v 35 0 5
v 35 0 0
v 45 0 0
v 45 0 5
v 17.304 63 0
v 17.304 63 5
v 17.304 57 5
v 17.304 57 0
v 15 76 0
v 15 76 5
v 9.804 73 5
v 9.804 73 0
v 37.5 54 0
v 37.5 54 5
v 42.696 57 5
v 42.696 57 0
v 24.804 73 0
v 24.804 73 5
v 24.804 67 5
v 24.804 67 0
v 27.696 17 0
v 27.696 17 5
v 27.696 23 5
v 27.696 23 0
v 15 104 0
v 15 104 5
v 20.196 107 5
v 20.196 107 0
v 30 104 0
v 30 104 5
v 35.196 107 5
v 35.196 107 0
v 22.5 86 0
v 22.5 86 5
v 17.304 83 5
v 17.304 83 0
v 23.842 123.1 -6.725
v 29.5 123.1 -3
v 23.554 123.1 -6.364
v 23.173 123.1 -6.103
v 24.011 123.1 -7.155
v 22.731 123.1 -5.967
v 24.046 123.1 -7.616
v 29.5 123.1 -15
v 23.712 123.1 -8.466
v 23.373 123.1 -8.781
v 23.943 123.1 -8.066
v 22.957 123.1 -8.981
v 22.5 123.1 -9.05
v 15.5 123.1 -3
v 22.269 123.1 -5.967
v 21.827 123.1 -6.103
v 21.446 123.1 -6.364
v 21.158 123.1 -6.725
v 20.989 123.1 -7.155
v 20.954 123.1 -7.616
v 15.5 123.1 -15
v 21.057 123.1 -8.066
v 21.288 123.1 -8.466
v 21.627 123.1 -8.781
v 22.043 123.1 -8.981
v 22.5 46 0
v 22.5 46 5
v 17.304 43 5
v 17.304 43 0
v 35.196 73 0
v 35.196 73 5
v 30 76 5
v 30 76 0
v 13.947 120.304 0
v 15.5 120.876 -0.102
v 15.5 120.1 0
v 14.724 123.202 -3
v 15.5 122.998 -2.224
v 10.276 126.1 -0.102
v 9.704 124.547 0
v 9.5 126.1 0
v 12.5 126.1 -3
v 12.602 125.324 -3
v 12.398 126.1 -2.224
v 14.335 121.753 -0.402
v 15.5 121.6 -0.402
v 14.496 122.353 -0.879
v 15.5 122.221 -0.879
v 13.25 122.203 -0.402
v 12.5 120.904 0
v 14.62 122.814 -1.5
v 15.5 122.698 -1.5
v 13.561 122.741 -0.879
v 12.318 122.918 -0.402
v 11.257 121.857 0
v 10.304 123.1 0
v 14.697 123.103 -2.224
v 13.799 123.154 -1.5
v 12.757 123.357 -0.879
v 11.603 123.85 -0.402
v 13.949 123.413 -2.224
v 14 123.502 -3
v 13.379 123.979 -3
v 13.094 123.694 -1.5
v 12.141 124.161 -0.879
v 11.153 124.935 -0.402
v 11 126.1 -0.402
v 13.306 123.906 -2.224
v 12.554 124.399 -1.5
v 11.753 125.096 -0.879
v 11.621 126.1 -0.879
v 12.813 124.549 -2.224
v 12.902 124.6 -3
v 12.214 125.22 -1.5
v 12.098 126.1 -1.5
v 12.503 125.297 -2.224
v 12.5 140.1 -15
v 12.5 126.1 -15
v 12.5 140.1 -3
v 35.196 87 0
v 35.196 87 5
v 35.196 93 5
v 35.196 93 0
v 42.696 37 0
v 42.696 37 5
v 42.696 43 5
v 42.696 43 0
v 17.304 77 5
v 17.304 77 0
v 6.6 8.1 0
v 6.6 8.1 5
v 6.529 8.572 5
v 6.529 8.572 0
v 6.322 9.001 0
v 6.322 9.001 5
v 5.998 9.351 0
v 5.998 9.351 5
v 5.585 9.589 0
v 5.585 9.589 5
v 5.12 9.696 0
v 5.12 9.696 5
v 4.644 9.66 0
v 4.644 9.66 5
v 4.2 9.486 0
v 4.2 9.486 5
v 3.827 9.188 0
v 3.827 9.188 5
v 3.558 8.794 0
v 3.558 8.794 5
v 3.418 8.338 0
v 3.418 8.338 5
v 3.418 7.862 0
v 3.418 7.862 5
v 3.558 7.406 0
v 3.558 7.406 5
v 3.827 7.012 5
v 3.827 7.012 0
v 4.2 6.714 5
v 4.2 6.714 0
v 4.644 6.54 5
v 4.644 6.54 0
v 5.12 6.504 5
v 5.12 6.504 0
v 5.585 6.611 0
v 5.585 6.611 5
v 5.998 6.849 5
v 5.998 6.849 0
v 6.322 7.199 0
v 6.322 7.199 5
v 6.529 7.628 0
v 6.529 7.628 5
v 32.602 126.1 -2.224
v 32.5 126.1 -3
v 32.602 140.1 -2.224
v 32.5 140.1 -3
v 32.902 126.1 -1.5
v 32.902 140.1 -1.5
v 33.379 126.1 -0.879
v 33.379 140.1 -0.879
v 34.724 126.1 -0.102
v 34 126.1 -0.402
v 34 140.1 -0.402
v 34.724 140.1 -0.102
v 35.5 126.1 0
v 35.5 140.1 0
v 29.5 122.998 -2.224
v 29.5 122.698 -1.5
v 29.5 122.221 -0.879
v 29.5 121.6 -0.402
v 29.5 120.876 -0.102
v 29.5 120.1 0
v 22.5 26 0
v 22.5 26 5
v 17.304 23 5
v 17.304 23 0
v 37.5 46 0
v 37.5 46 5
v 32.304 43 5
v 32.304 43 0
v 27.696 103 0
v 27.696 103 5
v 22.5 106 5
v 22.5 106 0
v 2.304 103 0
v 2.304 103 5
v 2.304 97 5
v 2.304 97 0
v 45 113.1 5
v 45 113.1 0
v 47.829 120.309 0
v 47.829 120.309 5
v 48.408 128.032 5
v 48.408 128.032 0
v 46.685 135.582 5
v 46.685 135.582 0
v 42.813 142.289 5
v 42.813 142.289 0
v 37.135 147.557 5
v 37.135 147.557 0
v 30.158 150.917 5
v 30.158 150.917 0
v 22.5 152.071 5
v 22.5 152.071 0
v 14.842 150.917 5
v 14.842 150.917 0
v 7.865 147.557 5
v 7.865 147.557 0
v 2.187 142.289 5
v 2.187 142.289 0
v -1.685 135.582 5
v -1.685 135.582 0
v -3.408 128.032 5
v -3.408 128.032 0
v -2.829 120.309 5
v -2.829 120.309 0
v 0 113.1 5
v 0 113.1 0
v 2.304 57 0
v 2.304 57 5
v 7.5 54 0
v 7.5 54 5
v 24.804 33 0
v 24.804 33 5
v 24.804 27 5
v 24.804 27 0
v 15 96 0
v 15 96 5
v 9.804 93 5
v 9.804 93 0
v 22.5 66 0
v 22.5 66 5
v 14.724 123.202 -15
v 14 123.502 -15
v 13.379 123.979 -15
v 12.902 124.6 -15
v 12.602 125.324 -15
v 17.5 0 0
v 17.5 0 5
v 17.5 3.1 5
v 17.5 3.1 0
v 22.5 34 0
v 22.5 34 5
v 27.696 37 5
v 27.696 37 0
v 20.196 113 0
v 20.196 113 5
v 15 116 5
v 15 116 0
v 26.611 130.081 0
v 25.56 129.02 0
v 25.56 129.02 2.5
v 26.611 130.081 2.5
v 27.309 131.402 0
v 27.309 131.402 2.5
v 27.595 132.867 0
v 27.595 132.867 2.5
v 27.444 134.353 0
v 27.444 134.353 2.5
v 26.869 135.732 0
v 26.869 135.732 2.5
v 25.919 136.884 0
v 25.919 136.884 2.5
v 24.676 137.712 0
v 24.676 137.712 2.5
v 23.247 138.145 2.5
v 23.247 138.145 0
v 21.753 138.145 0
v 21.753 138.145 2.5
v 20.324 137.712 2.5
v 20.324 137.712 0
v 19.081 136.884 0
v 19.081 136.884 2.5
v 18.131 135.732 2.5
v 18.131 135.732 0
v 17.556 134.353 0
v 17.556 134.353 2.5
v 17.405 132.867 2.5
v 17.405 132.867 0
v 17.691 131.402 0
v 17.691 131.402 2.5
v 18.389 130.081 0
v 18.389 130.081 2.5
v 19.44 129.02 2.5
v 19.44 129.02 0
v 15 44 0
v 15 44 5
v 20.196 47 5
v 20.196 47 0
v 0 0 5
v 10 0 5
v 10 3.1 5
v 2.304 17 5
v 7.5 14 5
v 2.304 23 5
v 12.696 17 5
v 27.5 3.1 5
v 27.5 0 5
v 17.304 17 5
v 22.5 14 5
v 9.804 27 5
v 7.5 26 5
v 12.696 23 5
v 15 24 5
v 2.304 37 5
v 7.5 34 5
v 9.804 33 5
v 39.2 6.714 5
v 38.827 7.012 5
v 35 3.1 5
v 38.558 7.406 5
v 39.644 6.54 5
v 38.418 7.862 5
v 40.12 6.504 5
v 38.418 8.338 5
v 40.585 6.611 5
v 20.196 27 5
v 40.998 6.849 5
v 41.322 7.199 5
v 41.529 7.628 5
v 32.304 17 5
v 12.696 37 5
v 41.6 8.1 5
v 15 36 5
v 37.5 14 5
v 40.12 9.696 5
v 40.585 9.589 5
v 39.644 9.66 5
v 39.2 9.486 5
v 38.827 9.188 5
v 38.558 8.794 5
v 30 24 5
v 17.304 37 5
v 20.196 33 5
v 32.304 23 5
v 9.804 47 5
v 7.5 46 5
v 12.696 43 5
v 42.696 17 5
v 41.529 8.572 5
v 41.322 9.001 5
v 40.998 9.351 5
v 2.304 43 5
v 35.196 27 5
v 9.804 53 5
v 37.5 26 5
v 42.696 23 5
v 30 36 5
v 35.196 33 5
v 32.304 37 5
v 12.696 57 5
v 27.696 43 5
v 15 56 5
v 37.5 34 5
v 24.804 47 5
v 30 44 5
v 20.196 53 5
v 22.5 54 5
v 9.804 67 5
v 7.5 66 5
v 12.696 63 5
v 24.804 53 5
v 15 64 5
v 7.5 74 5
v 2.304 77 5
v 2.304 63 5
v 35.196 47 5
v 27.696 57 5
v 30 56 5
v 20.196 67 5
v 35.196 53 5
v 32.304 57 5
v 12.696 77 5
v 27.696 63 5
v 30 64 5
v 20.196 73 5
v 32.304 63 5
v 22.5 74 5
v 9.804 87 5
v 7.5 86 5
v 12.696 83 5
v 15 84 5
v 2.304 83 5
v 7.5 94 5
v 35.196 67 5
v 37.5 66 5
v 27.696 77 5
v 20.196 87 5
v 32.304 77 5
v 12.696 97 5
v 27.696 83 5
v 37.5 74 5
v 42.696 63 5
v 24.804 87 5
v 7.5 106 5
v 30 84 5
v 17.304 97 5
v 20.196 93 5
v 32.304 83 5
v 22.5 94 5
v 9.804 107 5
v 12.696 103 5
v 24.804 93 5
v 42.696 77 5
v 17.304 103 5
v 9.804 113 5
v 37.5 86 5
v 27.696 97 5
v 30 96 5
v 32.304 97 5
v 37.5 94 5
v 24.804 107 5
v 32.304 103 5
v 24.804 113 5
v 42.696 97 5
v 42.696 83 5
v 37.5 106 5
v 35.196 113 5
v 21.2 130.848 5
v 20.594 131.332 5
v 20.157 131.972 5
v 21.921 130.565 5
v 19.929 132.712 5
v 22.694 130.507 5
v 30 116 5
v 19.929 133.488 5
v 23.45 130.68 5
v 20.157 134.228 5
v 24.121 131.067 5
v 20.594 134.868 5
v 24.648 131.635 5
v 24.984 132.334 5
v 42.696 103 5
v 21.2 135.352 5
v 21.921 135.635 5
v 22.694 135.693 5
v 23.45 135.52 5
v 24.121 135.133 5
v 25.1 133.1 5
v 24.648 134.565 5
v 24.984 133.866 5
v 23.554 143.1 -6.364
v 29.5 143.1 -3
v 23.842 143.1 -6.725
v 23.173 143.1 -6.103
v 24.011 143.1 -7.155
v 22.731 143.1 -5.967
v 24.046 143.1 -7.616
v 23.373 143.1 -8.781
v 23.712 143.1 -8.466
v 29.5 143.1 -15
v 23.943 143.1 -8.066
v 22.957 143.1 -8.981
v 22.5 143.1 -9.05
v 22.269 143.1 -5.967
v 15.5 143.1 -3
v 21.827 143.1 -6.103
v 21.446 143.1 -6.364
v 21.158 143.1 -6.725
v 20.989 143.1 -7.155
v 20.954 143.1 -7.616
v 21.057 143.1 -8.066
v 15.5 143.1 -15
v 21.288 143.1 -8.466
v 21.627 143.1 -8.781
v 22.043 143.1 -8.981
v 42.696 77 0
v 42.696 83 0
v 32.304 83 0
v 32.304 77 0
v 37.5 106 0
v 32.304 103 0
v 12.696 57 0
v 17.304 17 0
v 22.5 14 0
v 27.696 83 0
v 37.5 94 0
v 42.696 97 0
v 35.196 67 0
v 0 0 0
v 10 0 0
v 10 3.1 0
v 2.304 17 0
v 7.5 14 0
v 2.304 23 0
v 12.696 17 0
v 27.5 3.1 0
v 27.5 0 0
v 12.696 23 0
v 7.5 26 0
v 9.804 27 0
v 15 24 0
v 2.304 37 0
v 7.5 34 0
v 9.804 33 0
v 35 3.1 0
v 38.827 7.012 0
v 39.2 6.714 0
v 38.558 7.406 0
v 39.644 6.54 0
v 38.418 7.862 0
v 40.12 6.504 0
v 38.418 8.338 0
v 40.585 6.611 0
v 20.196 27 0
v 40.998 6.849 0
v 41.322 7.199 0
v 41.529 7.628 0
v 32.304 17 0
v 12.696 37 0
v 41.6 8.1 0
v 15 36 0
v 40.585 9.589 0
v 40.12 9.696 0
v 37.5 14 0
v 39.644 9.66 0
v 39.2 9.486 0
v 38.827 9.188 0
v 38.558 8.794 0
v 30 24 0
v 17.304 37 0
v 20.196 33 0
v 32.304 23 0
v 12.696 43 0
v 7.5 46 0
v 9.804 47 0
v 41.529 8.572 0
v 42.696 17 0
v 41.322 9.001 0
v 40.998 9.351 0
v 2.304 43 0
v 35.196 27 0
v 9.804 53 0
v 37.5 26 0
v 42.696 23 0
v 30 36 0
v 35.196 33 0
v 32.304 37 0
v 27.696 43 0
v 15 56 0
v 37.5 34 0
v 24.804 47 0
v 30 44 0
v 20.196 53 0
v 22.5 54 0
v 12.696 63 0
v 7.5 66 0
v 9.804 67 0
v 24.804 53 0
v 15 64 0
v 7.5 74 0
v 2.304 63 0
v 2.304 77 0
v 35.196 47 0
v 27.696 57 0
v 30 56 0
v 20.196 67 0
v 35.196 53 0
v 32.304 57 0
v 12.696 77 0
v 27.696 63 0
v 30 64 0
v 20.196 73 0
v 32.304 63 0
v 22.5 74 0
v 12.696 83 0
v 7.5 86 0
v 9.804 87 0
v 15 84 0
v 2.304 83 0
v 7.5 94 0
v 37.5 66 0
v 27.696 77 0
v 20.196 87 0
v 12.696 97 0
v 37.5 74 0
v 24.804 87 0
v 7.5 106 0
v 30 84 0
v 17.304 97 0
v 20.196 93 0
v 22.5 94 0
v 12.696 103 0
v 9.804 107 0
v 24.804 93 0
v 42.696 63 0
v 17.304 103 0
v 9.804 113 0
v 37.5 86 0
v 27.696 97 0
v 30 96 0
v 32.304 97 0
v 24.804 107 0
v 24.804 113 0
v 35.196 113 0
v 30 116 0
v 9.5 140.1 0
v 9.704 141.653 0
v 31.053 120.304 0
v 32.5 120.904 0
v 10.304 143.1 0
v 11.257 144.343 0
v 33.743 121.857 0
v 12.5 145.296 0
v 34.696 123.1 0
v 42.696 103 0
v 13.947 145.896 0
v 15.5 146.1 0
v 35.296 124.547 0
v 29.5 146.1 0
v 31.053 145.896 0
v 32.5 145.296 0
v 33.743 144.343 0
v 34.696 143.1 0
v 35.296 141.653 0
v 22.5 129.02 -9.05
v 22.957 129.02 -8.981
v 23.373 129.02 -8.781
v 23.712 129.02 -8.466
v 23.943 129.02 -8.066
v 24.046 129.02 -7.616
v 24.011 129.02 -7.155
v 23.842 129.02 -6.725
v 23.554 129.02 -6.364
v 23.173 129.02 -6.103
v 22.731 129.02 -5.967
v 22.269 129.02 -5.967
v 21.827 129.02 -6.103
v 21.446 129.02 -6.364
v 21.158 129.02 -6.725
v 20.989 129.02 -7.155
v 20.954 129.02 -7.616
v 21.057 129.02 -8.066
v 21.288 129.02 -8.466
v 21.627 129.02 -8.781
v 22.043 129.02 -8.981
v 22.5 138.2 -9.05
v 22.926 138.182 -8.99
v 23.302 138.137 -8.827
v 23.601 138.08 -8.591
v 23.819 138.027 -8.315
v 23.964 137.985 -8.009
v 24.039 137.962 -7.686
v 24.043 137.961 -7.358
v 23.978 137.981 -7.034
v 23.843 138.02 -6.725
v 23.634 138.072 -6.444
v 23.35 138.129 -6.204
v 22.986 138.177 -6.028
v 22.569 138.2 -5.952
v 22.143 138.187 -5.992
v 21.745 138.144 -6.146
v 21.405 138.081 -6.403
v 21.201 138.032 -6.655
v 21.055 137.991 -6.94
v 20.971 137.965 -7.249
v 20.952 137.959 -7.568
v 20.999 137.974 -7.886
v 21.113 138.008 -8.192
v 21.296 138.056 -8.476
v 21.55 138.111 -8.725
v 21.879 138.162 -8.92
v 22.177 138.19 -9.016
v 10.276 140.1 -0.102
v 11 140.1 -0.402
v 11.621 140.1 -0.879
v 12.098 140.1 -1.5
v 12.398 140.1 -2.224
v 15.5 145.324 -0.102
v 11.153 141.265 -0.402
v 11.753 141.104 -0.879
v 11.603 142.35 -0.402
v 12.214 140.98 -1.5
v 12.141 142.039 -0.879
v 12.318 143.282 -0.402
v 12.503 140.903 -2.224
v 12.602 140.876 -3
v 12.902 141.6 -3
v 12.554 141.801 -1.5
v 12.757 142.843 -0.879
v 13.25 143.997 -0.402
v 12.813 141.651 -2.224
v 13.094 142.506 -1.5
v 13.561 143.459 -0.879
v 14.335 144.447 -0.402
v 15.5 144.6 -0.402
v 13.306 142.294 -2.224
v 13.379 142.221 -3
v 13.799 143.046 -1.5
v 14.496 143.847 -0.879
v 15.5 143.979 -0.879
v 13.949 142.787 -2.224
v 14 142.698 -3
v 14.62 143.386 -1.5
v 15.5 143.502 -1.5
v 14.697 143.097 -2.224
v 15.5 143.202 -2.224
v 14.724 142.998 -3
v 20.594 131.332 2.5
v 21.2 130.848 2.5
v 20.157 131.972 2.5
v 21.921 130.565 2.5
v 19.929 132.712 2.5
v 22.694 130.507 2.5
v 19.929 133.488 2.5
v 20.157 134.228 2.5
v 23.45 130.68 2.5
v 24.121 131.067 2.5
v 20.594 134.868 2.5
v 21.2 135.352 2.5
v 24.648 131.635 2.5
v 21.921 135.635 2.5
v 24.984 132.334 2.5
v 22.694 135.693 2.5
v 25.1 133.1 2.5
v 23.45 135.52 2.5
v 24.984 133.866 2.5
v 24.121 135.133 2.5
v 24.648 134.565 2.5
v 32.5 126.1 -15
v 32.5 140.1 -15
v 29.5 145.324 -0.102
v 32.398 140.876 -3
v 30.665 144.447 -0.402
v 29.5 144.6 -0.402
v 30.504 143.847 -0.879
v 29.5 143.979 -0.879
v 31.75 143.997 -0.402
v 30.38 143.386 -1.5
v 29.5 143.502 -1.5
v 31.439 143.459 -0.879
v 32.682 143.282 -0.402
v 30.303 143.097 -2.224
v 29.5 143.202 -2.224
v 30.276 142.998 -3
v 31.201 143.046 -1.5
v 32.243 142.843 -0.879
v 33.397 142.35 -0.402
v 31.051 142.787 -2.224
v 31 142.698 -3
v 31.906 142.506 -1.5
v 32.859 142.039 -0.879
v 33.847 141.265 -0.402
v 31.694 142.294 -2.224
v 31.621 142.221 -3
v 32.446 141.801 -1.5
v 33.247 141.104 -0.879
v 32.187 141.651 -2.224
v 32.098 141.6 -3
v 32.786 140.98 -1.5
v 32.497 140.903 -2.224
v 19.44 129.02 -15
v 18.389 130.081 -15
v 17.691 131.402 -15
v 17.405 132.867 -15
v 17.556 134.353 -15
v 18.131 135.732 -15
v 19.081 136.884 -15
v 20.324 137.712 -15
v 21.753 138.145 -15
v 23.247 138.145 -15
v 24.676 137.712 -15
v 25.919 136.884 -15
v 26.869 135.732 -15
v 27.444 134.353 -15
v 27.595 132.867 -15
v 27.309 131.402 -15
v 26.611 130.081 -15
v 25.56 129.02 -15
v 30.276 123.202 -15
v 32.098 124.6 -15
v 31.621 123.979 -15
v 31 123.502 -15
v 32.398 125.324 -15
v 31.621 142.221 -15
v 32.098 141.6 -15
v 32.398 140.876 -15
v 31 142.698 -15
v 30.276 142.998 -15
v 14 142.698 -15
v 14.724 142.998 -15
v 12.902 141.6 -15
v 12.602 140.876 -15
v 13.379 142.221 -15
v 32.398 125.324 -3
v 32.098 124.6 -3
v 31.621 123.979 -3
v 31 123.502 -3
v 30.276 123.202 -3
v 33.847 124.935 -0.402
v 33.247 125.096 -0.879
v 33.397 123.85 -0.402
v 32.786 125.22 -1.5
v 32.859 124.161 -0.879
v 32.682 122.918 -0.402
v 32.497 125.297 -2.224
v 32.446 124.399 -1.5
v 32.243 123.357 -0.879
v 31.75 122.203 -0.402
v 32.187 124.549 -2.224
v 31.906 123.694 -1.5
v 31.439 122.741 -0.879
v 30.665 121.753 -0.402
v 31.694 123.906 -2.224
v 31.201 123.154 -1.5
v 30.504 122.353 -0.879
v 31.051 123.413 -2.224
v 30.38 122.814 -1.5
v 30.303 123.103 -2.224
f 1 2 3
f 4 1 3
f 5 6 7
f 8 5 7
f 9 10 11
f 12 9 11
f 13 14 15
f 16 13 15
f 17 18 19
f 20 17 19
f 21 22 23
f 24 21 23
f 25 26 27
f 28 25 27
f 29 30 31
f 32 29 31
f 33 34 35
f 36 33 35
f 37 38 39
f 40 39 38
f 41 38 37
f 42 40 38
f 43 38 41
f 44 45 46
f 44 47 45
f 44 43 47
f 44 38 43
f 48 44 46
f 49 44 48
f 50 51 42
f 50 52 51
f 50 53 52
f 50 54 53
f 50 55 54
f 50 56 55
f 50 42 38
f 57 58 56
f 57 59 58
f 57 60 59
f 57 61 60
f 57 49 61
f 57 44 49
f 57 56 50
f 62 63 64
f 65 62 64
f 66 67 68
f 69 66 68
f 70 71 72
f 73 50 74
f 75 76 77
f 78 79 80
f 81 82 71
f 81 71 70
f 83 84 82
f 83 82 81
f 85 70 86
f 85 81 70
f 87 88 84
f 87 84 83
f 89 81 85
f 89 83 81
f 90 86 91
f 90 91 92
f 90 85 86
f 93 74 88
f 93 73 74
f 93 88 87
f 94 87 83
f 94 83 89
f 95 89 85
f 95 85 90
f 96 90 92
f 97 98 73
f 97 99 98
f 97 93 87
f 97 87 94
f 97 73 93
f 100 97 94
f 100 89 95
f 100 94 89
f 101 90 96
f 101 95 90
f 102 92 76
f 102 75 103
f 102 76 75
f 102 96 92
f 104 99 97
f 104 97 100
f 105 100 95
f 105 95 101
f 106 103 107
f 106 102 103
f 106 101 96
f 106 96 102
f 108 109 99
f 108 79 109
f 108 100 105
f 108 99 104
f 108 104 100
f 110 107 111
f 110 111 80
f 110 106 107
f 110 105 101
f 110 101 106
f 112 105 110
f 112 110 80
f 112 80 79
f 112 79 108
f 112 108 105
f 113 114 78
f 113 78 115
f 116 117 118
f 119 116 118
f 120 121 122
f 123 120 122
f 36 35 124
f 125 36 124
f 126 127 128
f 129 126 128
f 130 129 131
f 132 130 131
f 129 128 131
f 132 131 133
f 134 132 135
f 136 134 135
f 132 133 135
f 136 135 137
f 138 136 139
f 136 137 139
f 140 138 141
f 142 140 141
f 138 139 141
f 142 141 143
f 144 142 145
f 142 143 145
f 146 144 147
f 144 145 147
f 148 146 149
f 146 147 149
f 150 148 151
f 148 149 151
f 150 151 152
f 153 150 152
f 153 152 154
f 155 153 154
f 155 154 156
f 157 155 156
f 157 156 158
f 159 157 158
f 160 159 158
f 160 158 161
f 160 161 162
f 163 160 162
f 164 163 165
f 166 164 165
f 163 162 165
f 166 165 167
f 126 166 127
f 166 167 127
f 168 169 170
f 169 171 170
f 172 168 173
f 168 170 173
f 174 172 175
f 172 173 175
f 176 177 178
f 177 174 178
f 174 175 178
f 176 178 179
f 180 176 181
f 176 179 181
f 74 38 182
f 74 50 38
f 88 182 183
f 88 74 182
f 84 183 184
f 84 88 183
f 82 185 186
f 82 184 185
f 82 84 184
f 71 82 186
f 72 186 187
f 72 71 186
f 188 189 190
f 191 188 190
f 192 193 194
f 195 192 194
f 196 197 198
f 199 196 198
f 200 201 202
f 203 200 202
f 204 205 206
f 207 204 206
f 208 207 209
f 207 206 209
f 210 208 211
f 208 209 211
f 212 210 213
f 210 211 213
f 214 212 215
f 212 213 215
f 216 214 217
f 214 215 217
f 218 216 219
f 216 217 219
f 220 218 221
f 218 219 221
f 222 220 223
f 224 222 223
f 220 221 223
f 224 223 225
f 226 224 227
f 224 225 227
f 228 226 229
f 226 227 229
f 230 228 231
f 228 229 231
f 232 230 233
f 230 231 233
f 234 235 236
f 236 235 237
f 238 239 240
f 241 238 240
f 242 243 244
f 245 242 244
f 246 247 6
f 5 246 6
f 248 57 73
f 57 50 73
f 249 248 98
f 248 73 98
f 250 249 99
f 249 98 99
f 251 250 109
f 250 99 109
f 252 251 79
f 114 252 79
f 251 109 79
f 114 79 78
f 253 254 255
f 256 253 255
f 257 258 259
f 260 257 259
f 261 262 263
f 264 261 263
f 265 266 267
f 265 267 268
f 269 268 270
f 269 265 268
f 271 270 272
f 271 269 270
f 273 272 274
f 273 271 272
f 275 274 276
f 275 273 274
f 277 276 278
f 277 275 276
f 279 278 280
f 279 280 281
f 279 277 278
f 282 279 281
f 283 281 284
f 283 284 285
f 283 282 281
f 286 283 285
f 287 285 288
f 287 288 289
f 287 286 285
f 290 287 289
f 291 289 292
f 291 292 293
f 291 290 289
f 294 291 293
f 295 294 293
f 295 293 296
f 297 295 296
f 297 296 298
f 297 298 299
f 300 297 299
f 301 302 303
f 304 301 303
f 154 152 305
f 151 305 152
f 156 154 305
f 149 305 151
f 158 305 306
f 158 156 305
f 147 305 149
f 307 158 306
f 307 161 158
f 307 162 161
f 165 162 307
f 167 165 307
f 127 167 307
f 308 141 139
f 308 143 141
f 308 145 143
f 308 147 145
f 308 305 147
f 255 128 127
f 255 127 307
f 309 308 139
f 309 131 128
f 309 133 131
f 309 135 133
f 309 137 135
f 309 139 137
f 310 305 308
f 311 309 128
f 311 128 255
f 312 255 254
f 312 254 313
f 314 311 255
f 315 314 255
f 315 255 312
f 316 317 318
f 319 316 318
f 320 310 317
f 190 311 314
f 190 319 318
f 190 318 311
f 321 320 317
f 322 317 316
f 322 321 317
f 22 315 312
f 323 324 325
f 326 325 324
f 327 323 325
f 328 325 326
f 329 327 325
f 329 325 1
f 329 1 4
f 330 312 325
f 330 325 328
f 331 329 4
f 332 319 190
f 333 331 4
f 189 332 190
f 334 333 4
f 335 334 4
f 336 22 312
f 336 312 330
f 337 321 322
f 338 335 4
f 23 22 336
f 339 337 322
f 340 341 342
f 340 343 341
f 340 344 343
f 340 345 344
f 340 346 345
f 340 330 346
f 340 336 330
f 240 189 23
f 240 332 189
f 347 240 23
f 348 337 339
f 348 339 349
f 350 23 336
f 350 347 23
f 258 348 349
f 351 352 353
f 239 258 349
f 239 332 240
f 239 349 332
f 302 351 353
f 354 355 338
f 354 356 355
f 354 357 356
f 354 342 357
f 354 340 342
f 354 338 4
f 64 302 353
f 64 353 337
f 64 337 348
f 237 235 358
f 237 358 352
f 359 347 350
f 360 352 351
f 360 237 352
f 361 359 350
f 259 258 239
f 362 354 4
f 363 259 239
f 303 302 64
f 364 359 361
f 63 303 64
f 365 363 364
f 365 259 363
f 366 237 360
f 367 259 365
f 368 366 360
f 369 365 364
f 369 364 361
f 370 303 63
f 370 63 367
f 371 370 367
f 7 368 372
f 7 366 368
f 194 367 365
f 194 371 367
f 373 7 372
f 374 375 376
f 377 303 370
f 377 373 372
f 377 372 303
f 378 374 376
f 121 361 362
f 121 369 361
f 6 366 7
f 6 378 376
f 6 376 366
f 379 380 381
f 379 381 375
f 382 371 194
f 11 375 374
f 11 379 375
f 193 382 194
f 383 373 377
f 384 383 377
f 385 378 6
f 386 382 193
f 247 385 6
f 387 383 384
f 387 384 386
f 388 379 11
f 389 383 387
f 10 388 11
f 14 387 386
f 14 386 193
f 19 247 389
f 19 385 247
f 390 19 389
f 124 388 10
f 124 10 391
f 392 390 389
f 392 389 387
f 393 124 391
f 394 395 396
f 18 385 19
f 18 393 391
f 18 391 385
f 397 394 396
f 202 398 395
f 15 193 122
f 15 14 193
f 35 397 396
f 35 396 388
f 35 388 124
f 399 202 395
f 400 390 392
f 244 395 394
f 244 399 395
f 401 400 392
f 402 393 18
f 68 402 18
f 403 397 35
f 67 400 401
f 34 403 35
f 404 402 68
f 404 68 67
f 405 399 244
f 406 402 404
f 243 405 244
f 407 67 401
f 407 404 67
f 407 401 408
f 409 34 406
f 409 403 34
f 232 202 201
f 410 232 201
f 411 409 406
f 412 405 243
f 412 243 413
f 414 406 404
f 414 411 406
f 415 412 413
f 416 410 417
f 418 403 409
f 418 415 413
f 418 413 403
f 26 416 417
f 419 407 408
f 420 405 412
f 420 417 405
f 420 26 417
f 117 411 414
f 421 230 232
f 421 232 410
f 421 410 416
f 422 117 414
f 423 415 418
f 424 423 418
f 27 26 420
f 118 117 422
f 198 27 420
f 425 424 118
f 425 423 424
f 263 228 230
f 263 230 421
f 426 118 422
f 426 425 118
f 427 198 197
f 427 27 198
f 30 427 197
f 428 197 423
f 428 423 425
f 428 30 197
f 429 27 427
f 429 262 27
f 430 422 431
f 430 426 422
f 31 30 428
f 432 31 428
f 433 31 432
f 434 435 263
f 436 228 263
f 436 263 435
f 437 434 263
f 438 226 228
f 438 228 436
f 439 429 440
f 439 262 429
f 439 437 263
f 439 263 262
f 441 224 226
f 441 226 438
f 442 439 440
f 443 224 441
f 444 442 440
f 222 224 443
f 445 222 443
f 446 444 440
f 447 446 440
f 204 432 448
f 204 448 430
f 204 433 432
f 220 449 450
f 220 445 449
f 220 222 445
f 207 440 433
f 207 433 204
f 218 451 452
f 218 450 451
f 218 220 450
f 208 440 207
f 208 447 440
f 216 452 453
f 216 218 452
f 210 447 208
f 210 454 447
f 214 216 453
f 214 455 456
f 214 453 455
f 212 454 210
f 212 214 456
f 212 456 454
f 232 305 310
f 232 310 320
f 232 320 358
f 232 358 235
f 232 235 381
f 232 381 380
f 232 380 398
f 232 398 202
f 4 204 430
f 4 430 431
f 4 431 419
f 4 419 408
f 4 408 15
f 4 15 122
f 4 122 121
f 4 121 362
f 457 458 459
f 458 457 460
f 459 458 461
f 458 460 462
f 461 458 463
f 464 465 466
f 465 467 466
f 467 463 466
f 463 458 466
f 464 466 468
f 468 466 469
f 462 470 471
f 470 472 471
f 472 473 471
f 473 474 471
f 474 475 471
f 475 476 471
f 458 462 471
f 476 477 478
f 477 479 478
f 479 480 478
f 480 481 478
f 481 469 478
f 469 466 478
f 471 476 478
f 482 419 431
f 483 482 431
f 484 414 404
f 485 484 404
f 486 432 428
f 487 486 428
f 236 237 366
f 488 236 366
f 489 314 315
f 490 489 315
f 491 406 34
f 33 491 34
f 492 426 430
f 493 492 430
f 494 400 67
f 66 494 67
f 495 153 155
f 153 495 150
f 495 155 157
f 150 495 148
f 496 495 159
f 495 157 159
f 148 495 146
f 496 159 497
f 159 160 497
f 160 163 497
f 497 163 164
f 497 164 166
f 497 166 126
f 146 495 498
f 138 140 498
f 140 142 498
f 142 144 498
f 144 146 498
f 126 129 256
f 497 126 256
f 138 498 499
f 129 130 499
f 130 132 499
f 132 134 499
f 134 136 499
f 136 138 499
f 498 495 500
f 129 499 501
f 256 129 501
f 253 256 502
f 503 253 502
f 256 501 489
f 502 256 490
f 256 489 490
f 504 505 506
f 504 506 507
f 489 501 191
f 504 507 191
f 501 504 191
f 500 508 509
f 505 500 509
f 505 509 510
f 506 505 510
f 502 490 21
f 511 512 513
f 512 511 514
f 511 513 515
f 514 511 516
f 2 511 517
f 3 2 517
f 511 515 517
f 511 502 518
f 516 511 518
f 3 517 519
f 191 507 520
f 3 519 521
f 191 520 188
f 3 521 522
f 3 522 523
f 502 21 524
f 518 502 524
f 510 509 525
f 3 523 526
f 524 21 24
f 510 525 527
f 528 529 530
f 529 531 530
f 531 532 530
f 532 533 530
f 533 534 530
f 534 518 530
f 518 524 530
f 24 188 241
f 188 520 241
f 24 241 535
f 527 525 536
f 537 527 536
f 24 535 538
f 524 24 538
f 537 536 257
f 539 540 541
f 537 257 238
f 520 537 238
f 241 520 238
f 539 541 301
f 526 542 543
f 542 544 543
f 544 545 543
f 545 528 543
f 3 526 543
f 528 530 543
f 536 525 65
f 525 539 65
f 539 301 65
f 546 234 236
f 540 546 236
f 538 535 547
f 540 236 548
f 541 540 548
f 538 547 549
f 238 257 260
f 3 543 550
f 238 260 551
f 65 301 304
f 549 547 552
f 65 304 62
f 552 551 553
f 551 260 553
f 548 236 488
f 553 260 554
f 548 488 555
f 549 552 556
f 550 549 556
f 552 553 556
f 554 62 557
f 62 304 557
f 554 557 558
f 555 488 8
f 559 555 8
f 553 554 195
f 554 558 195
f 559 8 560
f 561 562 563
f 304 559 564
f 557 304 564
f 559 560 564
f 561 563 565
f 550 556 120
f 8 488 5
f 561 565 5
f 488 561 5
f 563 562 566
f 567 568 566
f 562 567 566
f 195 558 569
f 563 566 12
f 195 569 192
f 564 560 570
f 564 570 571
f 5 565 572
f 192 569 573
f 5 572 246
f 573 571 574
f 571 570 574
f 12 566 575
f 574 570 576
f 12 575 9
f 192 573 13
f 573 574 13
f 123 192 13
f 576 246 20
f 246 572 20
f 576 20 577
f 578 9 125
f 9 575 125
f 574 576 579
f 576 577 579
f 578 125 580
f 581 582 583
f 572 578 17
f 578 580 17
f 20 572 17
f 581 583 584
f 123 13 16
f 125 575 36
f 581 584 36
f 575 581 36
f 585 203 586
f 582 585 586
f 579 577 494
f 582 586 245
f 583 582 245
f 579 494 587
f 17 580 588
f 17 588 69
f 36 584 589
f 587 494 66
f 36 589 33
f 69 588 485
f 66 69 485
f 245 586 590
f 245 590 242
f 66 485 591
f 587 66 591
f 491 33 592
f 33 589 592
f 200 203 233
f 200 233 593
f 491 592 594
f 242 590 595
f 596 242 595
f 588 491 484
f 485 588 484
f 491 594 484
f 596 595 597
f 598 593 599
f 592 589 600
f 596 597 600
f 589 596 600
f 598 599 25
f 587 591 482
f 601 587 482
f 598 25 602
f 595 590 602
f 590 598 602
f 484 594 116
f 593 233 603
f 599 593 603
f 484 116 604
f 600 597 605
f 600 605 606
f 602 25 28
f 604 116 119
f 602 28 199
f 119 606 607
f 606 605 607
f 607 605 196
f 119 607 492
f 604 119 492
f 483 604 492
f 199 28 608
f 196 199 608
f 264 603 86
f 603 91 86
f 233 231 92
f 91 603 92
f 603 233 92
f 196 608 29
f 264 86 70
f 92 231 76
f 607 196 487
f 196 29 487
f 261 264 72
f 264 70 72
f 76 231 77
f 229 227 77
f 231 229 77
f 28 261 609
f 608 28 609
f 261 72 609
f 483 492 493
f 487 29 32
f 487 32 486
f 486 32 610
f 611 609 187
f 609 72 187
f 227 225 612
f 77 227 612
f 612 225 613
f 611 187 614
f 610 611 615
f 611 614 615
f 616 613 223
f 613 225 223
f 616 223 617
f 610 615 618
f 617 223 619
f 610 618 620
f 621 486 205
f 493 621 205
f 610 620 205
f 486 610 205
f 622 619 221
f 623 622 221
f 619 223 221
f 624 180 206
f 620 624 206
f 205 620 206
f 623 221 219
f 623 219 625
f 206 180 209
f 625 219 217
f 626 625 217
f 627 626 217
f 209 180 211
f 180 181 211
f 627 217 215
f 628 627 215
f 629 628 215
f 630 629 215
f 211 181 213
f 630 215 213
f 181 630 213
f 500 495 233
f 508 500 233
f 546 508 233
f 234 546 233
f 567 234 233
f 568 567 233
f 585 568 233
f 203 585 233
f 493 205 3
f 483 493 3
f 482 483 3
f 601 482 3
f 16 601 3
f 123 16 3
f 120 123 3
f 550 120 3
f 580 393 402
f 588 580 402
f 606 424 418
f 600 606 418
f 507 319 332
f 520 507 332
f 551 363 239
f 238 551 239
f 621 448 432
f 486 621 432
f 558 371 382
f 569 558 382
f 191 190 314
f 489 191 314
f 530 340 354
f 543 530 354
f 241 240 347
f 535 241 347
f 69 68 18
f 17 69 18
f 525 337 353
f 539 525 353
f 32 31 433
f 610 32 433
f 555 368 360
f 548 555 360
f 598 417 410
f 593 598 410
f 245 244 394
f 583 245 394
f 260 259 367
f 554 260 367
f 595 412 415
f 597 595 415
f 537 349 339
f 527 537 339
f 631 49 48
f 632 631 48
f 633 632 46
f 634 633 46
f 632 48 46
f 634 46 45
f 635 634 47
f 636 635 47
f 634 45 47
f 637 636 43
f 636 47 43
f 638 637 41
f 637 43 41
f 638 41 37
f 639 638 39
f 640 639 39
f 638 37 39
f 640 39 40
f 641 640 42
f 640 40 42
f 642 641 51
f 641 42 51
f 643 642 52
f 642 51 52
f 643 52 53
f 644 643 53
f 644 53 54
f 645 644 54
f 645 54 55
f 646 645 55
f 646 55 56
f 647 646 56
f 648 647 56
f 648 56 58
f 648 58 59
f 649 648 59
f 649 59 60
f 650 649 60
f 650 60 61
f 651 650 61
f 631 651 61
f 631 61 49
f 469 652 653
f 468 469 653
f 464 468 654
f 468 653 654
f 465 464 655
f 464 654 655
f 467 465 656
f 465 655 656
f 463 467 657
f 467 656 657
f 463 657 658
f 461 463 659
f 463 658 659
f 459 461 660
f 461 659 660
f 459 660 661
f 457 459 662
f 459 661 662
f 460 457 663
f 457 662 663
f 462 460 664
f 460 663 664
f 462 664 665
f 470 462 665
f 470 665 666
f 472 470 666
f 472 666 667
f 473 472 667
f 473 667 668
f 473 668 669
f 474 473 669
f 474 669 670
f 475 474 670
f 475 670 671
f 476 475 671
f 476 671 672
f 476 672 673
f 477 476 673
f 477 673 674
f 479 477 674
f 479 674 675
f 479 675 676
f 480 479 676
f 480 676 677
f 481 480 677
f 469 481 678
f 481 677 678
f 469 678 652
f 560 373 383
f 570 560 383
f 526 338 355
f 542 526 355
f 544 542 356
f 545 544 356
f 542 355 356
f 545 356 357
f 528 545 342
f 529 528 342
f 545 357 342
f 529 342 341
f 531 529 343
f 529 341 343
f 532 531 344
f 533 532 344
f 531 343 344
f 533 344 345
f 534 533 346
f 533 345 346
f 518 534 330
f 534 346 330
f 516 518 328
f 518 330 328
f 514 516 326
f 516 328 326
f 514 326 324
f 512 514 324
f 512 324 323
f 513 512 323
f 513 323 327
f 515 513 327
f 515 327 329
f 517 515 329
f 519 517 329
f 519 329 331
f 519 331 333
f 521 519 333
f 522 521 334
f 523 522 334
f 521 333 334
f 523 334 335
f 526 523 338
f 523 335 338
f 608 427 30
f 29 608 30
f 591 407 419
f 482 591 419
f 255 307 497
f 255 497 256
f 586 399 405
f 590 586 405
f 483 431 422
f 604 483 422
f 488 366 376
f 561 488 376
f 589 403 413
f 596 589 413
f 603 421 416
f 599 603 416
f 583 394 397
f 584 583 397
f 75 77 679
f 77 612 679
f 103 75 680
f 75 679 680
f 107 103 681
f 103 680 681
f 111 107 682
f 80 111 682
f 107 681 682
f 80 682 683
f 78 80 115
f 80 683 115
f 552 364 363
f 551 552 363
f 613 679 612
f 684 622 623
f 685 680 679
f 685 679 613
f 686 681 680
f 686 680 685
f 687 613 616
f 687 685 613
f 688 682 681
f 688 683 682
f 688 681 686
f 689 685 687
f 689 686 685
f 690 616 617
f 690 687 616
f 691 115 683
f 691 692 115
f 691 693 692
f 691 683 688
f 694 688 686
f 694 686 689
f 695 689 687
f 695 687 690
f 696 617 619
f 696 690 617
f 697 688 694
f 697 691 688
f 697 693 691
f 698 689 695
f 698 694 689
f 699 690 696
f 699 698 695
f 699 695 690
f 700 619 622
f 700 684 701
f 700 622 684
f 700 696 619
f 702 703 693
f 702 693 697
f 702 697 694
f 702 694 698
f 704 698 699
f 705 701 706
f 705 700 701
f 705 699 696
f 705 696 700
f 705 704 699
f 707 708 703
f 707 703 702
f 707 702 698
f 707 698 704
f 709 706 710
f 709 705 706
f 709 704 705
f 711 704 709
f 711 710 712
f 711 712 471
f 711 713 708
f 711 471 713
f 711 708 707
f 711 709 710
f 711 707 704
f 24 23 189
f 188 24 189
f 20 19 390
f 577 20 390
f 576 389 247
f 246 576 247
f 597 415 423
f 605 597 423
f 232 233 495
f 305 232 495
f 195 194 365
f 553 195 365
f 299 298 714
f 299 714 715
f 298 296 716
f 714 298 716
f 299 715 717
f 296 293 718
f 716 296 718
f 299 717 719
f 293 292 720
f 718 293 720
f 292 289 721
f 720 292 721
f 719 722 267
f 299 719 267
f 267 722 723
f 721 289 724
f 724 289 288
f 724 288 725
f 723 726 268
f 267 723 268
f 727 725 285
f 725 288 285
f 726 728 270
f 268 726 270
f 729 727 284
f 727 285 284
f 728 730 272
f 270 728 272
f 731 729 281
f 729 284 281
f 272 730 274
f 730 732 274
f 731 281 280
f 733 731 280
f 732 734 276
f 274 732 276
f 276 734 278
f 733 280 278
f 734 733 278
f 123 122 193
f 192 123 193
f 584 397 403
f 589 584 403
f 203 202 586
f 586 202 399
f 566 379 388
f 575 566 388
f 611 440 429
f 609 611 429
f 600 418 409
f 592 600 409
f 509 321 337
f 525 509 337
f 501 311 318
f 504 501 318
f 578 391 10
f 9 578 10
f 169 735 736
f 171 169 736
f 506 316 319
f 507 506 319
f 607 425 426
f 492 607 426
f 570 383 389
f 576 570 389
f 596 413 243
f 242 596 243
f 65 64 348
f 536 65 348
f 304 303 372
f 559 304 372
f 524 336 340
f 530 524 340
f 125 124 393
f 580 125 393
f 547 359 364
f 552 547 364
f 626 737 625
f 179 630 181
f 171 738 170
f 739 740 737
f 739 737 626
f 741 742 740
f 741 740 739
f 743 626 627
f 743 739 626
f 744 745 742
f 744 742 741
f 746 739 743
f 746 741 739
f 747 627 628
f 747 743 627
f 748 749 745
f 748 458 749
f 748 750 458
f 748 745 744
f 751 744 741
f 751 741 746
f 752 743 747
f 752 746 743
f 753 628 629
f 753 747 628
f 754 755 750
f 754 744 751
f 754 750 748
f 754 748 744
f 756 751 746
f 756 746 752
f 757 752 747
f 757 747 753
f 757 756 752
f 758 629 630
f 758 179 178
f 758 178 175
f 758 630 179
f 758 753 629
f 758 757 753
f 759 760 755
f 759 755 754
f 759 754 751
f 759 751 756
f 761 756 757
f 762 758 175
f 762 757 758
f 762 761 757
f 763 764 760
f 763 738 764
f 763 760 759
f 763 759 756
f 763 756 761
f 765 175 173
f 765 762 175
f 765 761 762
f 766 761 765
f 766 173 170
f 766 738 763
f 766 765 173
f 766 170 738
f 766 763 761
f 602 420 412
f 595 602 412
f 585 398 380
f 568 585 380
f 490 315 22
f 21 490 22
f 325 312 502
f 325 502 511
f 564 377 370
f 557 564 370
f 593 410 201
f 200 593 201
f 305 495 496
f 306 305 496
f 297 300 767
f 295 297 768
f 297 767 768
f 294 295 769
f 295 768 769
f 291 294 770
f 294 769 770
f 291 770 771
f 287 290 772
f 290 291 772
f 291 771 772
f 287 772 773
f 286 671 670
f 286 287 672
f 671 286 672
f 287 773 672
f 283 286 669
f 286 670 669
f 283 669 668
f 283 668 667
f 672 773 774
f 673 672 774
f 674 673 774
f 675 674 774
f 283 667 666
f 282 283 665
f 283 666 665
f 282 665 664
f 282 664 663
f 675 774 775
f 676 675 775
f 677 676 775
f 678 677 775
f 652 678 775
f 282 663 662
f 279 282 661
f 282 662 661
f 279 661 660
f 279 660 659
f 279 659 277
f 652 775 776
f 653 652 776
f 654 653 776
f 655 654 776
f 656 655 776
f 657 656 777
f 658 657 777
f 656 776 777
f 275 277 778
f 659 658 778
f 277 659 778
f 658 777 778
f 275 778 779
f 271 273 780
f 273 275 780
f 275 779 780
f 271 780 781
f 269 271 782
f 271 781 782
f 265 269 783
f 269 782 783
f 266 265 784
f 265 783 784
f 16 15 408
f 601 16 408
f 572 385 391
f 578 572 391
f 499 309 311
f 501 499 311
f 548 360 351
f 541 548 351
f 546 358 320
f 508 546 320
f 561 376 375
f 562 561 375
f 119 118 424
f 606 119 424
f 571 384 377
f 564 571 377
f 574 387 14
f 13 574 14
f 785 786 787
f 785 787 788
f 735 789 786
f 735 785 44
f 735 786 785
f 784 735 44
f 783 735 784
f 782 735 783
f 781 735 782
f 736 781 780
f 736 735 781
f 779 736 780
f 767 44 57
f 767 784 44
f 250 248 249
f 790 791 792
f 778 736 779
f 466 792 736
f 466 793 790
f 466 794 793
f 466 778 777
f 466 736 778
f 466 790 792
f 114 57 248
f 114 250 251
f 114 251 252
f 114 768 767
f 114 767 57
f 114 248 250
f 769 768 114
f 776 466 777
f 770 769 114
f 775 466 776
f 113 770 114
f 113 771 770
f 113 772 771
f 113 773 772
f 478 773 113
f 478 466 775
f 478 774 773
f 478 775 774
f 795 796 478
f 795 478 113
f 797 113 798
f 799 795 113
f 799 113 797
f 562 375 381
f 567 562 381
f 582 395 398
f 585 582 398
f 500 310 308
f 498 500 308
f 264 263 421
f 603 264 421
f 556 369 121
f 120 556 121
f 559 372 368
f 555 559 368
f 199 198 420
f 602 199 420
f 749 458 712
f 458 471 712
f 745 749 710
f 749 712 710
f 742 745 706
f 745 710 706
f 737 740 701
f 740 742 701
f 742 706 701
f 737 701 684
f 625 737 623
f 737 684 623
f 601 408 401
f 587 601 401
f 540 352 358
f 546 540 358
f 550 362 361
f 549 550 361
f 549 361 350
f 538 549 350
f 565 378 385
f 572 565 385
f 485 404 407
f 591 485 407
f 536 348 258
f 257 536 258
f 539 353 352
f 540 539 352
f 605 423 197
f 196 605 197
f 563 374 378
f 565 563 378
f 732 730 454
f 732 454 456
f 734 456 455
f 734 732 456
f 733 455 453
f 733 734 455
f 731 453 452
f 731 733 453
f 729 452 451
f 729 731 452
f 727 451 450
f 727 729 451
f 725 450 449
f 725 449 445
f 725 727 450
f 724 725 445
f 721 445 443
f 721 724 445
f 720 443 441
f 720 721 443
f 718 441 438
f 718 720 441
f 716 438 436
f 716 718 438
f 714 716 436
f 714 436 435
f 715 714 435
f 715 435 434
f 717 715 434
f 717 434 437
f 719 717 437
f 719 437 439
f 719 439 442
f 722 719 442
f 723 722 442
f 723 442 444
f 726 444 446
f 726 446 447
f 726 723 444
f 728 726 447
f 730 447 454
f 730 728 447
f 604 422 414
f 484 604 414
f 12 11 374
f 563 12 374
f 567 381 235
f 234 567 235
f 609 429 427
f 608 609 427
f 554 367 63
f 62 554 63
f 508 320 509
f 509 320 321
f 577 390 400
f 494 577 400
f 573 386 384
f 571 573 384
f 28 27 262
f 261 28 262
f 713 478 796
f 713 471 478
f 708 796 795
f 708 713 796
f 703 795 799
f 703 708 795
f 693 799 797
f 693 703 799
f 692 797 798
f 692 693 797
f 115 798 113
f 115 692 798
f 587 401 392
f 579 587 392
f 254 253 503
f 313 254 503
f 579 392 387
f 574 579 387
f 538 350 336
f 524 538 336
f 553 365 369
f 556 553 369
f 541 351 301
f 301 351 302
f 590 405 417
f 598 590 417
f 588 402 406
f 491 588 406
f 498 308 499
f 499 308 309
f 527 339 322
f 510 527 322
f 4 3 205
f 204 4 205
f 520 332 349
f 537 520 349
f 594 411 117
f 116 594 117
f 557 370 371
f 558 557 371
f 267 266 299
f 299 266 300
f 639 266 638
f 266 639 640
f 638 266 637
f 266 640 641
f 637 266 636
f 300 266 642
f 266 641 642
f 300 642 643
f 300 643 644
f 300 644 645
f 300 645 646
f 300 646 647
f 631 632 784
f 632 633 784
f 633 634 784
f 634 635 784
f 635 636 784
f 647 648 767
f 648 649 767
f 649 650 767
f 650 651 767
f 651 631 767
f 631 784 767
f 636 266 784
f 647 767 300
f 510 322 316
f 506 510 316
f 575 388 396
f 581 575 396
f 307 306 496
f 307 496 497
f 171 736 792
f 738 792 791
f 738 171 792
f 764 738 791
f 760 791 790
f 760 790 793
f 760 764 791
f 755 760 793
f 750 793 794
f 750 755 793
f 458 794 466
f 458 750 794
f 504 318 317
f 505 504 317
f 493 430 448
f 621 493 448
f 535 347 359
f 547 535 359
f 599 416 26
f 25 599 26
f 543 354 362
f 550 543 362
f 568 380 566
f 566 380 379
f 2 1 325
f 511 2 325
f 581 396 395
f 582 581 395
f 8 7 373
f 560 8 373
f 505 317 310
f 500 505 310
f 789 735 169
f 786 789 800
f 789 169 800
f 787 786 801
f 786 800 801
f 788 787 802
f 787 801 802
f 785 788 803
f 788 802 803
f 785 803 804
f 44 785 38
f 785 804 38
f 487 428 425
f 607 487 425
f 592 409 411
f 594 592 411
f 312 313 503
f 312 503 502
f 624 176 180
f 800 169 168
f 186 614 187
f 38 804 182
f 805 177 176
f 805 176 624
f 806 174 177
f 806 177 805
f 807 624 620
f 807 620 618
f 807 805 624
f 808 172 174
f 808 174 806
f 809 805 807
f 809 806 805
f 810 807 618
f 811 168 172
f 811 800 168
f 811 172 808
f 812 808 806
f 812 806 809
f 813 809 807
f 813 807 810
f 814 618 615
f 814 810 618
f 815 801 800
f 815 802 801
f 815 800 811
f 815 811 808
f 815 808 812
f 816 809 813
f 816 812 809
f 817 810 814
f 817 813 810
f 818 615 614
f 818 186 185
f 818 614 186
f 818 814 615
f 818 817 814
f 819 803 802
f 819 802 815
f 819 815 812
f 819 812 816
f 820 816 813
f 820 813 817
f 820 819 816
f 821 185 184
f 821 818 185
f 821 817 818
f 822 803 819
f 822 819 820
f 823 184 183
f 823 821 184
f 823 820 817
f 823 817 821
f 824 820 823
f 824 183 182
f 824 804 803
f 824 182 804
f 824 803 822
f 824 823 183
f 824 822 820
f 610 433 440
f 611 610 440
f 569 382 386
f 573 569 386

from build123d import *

# Parameters (mm, degrees)
EXTRUDE_1_DEPTH     = 5
SKETCH_2_R          = 1.6
SKETCH_2_W          = 7.5
SKETCH_2_H          = 3.1
CUT_EXTRUDE_1_DEPTH = 5
EXTRUDE_START       = -2.5
SKETCH_3_R          = 2.6
EXTRUDE_2_DEPTH     = 2.5
EXTRUDE_START_2     = 15
SKETCH_4_W          = 20
SKETCH_4_H          = 20
EXTRUDE_3_DEPTH     = 15
CUT_EXTRUDE_2_REACH = 135.15
SKETCH_5_R          = 1.55
FILLET_2_R          = 3


with BuildPart() as part:
    # 草图1 → 凸台-拉伸1 (new body)
    with BuildSketch(Plane.XY):
        with BuildLine():
            Line((0, 0), (45, 0))
            Line((45, 0), (45, 113.1))
            ThreePointArc((45, 113.1), (22.5, 152.07114317), (0, 113.1))
            Line((0, 113.1), (0, 0))
        make_face()
        with BuildLine():
            Line((19.44, 129.02), (25.56, 129.02))
            ThreePointArc((25.56, 129.02), (22.5, 138.2), (19.44, 129.02))
        make_face(mode=Mode.SUBTRACT)
    extrude(amount=EXTRUDE_1_DEPTH)

    # 草图2 → 切除-拉伸1 (cut)
    with BuildSketch(Plane.XY.offset(5)):
        with Locations((40, 8.1)):
            Circle(SKETCH_2_R)
        with Locations((5, 8.1)):
            Circle(SKETCH_2_R)
        with Locations((31.25, 1.55)):
            Rectangle(SKETCH_2_W, SKETCH_2_H)
        with Locations((13.75, 1.55)):
            Rectangle(SKETCH_2_W, SKETCH_2_H)
        Polygon((7.5, 26), (2.303847577, 23), (2.303847577, 17), (7.5, 14), (12.696152423, 17), (12.696152423, 23), align=None)
        Polygon((22.5, 26), (17.303847577, 23), (17.303847577, 17), (22.5, 14), (27.696152423, 17), (27.696152423, 23), align=None)
        Polygon((37.5, 26), (32.303847577, 23), (32.303847577, 17), (37.5, 14), (42.696152423, 17), (42.696152423, 23), align=None)
        Polygon((15, 56), (9.803847577, 53), (9.803847577, 47), (15, 44), (20.196152423, 47), (20.196152423, 53), align=None)
        Polygon((15, 36), (9.803847577, 33), (9.803847577, 27), (15, 24), (20.196152423, 27), (20.196152423, 33), align=None)
        Polygon((30, 36), (24.803847577, 33), (24.803847577, 27), (30, 24), (35.196152423, 27), (35.196152423, 33), align=None)
        Polygon((30, 56), (24.803847577, 53), (24.803847577, 47), (30, 44), (35.196152423, 47), (35.196152423, 53), align=None)
        Polygon((37.5, 46), (32.303847577, 43), (32.303847577, 37), (37.5, 34), (42.696152423, 37), (42.696152423, 43), align=None)
        Polygon((22.5, 46), (17.303847577, 43), (17.303847577, 37), (22.5, 34), (27.696152423, 37), (27.696152423, 43), align=None)
        Polygon((7.5, 46), (2.303847577, 43), (2.303847577, 37), (7.5, 34), (12.696152423, 37), (12.696152423, 43), align=None)
        Polygon((15, 76), (9.803847577, 73), (9.803847577, 67), (15, 64), (20.196152423, 67), (20.196152423, 73), align=None)
        Polygon((30, 76), (24.803847577, 73), (24.803847577, 67), (30, 64), (35.196152423, 67), (35.196152423, 73), align=None)
        Polygon((37.5, 66), (32.303847577, 63), (32.303847577, 57), (37.5, 54), (42.696152423, 57), (42.696152423, 63), align=None)
        Polygon((22.5, 66), (17.303847577, 63), (17.303847577, 57), (22.5, 54), (27.696152423, 57), (27.696152423, 63), align=None)
        Polygon((7.5, 66), (2.303847577, 63), (2.303847577, 57), (7.5, 54), (12.696152423, 57), (12.696152423, 63), align=None)
        Polygon((15, 96), (9.803847577, 93), (9.803847577, 87), (15, 84), (20.196152423, 87), (20.196152423, 93), align=None)
        Polygon((30, 96), (24.803847577, 93), (24.803847577, 87), (30, 84), (35.196152423, 87), (35.196152423, 93), align=None)
        Polygon((37.5, 86), (32.303847577, 83), (32.303847577, 77), (37.5, 74), (42.696152423, 77), (42.696152423, 83), align=None)
        Polygon((22.5, 86), (17.303847577, 83), (17.303847577, 77), (22.5, 74), (27.696152423, 77), (27.696152423, 83), align=None)
        Polygon((7.5, 86), (2.303847577, 83), (2.303847577, 77), (7.5, 74), (12.696152423, 77), (12.696152423, 83), align=None)
        Polygon((15, 116), (9.803847577, 113), (9.803847577, 107), (15, 104), (20.196152423, 107), (20.196152423, 113), align=None)
        Polygon((30, 116), (24.803847577, 113), (24.803847577, 107), (30, 104), (35.196152423, 107), (35.196152423, 113), align=None)
        Polygon((37.5, 106), (32.303847577, 103), (32.303847577, 97), (37.5, 94), (42.696152423, 97), (42.696152423, 103), align=None)
        Polygon((22.5, 106), (17.303847577, 103), (17.303847577, 97), (22.5, 94), (27.696152423, 97), (27.696152423, 103), align=None)
        Polygon((7.5, 106), (2.303847577, 103), (2.303847577, 97), (7.5, 94), (12.696152423, 97), (12.696152423, 103), align=None)
    extrude(amount=-CUT_EXTRUDE_1_DEPTH, mode=Mode.SUBTRACT)

    # 草图3 → 凸台-拉伸2 (add)
    with BuildSketch(Plane.XY.offset(5).offset(EXTRUDE_START)):
        with BuildLine():
            Line((19.44, 129.02), (25.56, 129.02))
            ThreePointArc((25.56, 129.02), (22.5, 138.2), (19.44, 129.02))
        make_face()
        with Locations((22.5, 133.1)):
            Circle(SKETCH_3_R, mode=Mode.SUBTRACT)
    extrude(amount=EXTRUDE_2_DEPTH)

    # 草图4 → 凸台-拉伸3 (add)
    with BuildSketch(Plane(origin=(0, 0, 0), x_dir=(-1, 0, 0), z_dir=(0, 0, -1)).offset(EXTRUDE_START_2)):
        with Locations((-22.5, 133.1)):
            Rectangle(SKETCH_4_W, SKETCH_4_H)
        with BuildLine():
            Line((-25.56, 129.02), (-19.44, 129.02))
            ThreePointArc((-19.44, 129.02), (-22.5, 138.2), (-25.56, 129.02))
        make_face(mode=Mode.SUBTRACT)
    extrude(amount=-EXTRUDE_3_DEPTH)

    # 切除-拉伸2: up to this face of the body (flat: up to its plane)
    cut_extrude_2_end = Plane(part.part.faces().sort_by_distance((22.5, 143.1, -7.5))[0])
    # 草图5 → 切除-拉伸2 (cut, up to the picked face)
    with BuildSketch(Plane.XZ.offset(-123.1), mode=Mode.PRIVATE) as cut_extrude_2_sk1:
        with Locations(Location((22.5, -7.5, 0), (0, 0, 270))):
            Circle(SKETCH_5_R)
    cut_extrude_2_tool1 = split(extrude(cut_extrude_2_sk1.sketch, amount=-CUT_EXTRUDE_2_REACH, mode=Mode.PRIVATE), bisect_by=cut_extrude_2_end, keep=Keep.BOTH, mode=Mode.PRIVATE)
    add(cut_extrude_2_tool1.solids().sort_by(Axis((22.5, 123.1, -7.5), (0, 1, 0)))[0], mode=Mode.SUBTRACT)

    # 圆角2
    fillet_2_edges = [part.edges().sort_by_distance(p)[0] for p in [
        (32.5, 133.1, 0),
        (32.5, 143.1, -7.5),
        (22.5, 123.1, 0),
        (32.5, 123.1, -7.5),
        (12.5, 133.1, 0),
        (12.5, 123.1, -7.5),
        (22.5, 143.1, 0),
        (12.5, 143.1, -7.5),
    ]]
    fillet(fillet_2_edges, radius=FILLET_2_R)


solid = part.part
